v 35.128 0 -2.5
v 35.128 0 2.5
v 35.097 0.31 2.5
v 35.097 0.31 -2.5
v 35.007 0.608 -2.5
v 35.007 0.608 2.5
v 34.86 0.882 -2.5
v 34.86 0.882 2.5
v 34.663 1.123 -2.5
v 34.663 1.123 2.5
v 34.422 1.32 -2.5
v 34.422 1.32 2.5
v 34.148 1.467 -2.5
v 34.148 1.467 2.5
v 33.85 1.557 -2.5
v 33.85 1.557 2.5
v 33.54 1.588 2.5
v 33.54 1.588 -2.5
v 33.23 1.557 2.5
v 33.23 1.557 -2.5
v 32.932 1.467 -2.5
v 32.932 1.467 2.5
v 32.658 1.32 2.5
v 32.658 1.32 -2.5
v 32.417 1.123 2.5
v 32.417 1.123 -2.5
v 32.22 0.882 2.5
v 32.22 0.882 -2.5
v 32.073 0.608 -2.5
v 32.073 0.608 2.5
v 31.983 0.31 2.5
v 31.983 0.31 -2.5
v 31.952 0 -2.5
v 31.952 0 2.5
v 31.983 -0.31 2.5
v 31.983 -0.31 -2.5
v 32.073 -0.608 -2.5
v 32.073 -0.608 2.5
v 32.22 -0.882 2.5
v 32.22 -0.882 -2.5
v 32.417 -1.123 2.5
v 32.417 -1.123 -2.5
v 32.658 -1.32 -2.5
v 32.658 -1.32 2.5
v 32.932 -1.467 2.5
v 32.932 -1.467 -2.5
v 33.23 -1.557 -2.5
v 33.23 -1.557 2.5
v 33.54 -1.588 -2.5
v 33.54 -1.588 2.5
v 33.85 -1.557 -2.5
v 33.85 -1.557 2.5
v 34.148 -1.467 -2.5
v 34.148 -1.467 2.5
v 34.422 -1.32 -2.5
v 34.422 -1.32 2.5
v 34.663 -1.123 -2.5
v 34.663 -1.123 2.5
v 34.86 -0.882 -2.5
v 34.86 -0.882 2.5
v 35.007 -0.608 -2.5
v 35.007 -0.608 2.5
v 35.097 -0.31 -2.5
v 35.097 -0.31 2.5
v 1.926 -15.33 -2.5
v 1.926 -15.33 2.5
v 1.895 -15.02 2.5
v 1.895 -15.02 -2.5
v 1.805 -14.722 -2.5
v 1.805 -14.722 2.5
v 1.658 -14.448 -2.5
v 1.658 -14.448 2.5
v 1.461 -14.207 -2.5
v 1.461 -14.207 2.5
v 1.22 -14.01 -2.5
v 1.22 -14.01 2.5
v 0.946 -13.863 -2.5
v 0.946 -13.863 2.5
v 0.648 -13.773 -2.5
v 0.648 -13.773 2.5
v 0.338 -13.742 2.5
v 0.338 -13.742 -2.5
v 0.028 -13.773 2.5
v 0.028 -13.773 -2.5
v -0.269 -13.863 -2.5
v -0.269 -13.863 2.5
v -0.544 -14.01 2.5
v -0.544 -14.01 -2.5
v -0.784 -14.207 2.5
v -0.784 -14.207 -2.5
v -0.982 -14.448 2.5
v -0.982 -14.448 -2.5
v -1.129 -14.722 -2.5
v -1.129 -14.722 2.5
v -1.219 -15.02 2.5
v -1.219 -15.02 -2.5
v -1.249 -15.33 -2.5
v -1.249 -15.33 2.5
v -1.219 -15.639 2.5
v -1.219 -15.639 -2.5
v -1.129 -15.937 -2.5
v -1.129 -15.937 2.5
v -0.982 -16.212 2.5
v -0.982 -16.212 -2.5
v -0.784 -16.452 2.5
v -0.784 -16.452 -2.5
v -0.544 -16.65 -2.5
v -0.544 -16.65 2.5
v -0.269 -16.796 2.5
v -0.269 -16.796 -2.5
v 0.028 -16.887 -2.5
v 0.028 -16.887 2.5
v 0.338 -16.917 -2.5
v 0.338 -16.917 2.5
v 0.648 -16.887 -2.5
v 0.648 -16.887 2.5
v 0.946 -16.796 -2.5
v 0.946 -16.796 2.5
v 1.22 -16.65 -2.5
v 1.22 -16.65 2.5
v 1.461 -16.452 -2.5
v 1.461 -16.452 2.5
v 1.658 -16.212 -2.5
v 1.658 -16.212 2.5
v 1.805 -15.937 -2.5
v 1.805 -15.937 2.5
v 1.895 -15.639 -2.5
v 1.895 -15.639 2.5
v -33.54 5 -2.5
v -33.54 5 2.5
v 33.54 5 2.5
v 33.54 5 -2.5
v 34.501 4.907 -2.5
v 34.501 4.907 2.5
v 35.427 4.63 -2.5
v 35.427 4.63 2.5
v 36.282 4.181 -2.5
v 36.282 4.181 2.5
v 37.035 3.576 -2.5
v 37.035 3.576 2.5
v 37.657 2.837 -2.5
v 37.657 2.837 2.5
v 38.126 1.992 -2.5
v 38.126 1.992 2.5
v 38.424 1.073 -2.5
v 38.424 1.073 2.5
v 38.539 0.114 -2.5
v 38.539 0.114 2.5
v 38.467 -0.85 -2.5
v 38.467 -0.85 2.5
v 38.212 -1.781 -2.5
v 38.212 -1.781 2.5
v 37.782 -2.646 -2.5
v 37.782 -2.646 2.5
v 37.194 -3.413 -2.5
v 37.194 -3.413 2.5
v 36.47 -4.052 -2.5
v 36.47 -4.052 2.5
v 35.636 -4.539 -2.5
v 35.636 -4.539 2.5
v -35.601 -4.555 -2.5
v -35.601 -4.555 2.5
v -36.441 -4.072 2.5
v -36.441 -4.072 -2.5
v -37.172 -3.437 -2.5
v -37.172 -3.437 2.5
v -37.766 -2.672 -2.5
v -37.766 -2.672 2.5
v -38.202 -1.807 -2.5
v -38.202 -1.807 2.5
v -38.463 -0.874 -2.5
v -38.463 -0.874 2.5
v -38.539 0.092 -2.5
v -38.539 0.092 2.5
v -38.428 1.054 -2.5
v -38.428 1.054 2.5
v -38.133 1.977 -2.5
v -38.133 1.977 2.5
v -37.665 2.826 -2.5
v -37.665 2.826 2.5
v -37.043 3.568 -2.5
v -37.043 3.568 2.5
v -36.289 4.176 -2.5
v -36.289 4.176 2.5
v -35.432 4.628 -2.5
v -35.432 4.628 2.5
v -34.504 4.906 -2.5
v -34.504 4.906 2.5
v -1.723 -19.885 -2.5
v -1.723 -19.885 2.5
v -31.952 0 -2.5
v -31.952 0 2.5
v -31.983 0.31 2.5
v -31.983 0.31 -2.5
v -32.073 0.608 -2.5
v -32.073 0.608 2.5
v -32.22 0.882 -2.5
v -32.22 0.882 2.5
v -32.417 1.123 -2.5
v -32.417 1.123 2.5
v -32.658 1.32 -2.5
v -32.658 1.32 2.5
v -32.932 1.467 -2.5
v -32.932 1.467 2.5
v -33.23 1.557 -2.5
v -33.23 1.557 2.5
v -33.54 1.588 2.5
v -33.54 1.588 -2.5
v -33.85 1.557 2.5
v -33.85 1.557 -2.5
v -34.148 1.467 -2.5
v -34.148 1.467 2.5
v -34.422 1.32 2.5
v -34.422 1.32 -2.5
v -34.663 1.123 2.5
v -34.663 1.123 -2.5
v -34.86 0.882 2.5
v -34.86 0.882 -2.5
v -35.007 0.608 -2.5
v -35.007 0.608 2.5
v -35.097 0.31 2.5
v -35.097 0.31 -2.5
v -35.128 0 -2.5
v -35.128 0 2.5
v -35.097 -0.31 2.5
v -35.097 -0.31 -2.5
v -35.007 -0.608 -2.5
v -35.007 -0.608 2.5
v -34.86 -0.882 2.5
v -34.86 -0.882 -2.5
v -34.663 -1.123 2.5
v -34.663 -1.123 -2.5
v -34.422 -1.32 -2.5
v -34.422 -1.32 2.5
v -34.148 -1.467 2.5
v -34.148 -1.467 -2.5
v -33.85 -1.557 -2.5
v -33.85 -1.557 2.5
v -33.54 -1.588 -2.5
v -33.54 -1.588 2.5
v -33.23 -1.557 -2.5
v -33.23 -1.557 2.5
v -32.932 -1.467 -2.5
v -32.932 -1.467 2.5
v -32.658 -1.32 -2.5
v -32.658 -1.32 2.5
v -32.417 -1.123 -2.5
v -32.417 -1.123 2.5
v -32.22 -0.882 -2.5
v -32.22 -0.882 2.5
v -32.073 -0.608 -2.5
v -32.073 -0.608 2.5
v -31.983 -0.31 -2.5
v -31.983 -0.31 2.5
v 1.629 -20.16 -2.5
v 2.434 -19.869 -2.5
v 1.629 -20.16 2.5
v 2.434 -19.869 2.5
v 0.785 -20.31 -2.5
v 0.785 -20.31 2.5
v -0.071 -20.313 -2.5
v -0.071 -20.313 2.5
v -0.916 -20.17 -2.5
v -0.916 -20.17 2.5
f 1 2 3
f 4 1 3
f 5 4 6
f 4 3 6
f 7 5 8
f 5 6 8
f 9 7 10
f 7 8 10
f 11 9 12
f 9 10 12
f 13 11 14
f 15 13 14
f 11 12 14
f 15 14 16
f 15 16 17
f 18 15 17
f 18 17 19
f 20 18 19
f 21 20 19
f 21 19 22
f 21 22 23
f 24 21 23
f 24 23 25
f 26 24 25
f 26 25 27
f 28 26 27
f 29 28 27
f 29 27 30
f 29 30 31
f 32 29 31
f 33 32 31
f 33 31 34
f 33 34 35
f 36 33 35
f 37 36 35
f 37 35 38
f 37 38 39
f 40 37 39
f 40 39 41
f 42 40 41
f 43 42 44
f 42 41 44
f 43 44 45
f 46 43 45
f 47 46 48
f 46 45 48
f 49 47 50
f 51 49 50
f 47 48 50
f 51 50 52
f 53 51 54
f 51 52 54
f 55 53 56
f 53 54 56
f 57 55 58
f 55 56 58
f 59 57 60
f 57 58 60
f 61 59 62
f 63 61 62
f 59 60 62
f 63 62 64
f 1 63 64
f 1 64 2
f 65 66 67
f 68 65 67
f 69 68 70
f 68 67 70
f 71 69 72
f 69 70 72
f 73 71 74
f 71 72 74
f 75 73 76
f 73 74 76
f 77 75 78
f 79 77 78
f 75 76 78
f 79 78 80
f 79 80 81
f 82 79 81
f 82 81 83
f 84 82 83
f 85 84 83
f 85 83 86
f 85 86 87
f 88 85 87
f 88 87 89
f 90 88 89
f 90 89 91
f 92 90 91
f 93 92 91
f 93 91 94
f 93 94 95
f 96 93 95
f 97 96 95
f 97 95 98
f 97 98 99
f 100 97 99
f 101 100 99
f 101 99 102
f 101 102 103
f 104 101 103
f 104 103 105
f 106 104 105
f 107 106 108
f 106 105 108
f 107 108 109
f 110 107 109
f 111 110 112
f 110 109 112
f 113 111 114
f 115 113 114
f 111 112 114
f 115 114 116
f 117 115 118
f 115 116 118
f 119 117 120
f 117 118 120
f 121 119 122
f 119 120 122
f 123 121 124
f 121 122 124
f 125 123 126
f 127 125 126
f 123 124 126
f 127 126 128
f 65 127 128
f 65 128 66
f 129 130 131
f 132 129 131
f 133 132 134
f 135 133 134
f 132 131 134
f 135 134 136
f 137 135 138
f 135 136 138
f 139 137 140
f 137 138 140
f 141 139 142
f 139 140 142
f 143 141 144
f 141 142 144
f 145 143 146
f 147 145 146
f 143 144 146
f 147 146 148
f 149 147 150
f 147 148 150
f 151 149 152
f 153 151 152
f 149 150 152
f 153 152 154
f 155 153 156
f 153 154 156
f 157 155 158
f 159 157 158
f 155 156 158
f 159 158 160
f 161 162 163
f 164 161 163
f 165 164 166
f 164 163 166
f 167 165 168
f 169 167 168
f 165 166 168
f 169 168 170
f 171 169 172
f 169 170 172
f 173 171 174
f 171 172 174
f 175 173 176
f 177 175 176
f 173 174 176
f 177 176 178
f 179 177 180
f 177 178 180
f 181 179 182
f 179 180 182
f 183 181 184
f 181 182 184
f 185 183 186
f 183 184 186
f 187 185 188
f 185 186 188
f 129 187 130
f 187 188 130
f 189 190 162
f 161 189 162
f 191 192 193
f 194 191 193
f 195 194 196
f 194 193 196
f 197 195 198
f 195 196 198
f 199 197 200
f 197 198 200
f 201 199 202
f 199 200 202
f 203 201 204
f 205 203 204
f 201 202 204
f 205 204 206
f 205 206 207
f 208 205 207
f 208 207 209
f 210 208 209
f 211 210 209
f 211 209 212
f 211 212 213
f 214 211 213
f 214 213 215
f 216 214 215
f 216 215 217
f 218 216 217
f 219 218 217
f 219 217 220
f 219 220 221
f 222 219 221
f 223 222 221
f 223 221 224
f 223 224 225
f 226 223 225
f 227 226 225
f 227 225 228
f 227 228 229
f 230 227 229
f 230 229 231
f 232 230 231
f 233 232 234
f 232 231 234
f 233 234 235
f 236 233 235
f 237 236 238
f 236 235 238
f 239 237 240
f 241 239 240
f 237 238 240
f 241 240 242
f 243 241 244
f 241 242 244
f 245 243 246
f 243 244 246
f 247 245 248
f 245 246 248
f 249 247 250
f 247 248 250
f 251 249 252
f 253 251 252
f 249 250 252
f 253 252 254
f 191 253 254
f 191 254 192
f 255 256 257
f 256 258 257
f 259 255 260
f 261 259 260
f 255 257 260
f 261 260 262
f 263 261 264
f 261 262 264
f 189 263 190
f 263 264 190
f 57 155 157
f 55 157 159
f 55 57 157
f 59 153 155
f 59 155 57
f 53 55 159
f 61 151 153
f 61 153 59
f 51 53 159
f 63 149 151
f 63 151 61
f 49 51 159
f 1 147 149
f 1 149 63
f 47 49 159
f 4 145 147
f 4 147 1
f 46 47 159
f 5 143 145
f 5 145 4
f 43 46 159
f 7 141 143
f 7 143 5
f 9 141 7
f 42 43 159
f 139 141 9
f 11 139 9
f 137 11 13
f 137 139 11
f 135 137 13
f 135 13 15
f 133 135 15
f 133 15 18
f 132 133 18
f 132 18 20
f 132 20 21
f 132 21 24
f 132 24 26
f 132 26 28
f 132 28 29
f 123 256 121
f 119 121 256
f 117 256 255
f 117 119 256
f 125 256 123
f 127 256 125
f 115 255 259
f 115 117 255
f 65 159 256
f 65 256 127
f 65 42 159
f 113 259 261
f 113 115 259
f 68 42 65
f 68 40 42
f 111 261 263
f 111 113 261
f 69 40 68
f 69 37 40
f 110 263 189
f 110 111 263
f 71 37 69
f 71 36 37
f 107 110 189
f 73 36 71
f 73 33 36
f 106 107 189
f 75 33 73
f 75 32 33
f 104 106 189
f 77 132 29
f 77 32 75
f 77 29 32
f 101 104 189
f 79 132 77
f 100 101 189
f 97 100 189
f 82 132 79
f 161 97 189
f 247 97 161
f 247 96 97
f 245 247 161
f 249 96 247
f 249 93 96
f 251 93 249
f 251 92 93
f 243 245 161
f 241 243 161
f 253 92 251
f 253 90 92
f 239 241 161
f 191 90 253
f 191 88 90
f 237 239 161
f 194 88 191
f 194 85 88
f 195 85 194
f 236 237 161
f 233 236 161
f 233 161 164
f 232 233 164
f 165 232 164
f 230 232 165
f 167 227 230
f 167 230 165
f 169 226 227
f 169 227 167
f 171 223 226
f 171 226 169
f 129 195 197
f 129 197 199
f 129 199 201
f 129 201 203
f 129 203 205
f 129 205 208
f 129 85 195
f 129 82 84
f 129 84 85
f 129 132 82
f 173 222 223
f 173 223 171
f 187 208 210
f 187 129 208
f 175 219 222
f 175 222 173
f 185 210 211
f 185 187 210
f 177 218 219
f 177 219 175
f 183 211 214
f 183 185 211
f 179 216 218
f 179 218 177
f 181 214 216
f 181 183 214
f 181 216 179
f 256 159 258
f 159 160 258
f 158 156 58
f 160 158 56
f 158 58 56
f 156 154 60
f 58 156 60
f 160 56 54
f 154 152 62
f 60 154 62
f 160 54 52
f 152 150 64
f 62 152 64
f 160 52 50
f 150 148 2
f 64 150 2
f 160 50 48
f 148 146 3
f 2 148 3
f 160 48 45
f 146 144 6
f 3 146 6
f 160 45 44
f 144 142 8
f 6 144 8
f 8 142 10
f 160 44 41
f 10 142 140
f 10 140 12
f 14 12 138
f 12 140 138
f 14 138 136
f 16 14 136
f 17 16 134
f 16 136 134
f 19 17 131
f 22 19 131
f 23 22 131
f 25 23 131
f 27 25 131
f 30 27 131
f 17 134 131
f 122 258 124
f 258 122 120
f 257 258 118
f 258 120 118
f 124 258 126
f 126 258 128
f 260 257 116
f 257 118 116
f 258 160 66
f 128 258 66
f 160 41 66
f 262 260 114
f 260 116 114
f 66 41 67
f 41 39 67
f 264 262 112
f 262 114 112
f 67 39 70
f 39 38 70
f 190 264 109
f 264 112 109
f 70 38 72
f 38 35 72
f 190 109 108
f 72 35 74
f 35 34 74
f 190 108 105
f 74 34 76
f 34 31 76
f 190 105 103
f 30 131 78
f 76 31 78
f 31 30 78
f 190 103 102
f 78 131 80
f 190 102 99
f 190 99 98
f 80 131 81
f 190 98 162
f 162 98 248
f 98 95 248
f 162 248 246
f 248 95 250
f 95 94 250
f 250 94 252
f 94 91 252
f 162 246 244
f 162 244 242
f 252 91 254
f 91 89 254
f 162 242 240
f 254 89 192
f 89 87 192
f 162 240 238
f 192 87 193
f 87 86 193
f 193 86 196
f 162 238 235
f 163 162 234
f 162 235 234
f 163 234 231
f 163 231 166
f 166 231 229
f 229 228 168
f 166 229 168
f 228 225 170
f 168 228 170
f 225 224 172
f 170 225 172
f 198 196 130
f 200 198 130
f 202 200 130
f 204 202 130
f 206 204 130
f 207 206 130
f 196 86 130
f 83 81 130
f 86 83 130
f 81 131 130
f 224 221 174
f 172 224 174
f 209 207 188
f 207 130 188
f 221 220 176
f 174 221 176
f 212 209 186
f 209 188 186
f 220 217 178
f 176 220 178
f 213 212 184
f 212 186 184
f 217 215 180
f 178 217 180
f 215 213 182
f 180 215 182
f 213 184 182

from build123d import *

# Parameters (mm, degrees)
BOSS_EXTRUDE1_DEPTH = 2.5
SKETCH2_R           = 1.5875
CUT_EXTRUDE1_DEPTH  = 44.859171323


with BuildPart() as part:
    # Sketch1 → Boss-Extrude1 (new, symmetric)
    with BuildSketch(Plane.XY):
        with BuildLine():
            Line((-33.54, 5), (33.54, 5))
            ThreePointArc((33.54, 5), (38.423518139, 1.072963462), (35.635934611, -4.539499764))
            Line((35.635934611, -4.539499764), (2.434033336, -19.869165506))
            ThreePointArc((2.434033336, -19.869165506), (0.357155817, -20.329629424), (-1.723171376, -19.885010467))
            Line((-1.723171376, -19.885010467), (-35.601270101, -4.555344726))
            ThreePointArc((-35.601270101, -4.555344726), (-38.42757218, 1.054342537), (-33.54, 5))
        make_face()
    extrude(amount=BOSS_EXTRUDE1_DEPTH, both=True)

    # Sketch2 → Cut-Extrude1 (cut, through all)
    with BuildSketch(Plane.XY.offset(2.5)):
        with Locations((-33.54, 0)):
            Circle(SKETCH2_R)
        with Locations((33.54, 0)):
            Circle(SKETCH2_R)
        with Locations((0.338098725, -15.329665742)):
            Circle(SKETCH2_R)
    extrude(amount=-CUT_EXTRUDE1_DEPTH, mode=Mode.SUBTRACT)


solid = part.part
